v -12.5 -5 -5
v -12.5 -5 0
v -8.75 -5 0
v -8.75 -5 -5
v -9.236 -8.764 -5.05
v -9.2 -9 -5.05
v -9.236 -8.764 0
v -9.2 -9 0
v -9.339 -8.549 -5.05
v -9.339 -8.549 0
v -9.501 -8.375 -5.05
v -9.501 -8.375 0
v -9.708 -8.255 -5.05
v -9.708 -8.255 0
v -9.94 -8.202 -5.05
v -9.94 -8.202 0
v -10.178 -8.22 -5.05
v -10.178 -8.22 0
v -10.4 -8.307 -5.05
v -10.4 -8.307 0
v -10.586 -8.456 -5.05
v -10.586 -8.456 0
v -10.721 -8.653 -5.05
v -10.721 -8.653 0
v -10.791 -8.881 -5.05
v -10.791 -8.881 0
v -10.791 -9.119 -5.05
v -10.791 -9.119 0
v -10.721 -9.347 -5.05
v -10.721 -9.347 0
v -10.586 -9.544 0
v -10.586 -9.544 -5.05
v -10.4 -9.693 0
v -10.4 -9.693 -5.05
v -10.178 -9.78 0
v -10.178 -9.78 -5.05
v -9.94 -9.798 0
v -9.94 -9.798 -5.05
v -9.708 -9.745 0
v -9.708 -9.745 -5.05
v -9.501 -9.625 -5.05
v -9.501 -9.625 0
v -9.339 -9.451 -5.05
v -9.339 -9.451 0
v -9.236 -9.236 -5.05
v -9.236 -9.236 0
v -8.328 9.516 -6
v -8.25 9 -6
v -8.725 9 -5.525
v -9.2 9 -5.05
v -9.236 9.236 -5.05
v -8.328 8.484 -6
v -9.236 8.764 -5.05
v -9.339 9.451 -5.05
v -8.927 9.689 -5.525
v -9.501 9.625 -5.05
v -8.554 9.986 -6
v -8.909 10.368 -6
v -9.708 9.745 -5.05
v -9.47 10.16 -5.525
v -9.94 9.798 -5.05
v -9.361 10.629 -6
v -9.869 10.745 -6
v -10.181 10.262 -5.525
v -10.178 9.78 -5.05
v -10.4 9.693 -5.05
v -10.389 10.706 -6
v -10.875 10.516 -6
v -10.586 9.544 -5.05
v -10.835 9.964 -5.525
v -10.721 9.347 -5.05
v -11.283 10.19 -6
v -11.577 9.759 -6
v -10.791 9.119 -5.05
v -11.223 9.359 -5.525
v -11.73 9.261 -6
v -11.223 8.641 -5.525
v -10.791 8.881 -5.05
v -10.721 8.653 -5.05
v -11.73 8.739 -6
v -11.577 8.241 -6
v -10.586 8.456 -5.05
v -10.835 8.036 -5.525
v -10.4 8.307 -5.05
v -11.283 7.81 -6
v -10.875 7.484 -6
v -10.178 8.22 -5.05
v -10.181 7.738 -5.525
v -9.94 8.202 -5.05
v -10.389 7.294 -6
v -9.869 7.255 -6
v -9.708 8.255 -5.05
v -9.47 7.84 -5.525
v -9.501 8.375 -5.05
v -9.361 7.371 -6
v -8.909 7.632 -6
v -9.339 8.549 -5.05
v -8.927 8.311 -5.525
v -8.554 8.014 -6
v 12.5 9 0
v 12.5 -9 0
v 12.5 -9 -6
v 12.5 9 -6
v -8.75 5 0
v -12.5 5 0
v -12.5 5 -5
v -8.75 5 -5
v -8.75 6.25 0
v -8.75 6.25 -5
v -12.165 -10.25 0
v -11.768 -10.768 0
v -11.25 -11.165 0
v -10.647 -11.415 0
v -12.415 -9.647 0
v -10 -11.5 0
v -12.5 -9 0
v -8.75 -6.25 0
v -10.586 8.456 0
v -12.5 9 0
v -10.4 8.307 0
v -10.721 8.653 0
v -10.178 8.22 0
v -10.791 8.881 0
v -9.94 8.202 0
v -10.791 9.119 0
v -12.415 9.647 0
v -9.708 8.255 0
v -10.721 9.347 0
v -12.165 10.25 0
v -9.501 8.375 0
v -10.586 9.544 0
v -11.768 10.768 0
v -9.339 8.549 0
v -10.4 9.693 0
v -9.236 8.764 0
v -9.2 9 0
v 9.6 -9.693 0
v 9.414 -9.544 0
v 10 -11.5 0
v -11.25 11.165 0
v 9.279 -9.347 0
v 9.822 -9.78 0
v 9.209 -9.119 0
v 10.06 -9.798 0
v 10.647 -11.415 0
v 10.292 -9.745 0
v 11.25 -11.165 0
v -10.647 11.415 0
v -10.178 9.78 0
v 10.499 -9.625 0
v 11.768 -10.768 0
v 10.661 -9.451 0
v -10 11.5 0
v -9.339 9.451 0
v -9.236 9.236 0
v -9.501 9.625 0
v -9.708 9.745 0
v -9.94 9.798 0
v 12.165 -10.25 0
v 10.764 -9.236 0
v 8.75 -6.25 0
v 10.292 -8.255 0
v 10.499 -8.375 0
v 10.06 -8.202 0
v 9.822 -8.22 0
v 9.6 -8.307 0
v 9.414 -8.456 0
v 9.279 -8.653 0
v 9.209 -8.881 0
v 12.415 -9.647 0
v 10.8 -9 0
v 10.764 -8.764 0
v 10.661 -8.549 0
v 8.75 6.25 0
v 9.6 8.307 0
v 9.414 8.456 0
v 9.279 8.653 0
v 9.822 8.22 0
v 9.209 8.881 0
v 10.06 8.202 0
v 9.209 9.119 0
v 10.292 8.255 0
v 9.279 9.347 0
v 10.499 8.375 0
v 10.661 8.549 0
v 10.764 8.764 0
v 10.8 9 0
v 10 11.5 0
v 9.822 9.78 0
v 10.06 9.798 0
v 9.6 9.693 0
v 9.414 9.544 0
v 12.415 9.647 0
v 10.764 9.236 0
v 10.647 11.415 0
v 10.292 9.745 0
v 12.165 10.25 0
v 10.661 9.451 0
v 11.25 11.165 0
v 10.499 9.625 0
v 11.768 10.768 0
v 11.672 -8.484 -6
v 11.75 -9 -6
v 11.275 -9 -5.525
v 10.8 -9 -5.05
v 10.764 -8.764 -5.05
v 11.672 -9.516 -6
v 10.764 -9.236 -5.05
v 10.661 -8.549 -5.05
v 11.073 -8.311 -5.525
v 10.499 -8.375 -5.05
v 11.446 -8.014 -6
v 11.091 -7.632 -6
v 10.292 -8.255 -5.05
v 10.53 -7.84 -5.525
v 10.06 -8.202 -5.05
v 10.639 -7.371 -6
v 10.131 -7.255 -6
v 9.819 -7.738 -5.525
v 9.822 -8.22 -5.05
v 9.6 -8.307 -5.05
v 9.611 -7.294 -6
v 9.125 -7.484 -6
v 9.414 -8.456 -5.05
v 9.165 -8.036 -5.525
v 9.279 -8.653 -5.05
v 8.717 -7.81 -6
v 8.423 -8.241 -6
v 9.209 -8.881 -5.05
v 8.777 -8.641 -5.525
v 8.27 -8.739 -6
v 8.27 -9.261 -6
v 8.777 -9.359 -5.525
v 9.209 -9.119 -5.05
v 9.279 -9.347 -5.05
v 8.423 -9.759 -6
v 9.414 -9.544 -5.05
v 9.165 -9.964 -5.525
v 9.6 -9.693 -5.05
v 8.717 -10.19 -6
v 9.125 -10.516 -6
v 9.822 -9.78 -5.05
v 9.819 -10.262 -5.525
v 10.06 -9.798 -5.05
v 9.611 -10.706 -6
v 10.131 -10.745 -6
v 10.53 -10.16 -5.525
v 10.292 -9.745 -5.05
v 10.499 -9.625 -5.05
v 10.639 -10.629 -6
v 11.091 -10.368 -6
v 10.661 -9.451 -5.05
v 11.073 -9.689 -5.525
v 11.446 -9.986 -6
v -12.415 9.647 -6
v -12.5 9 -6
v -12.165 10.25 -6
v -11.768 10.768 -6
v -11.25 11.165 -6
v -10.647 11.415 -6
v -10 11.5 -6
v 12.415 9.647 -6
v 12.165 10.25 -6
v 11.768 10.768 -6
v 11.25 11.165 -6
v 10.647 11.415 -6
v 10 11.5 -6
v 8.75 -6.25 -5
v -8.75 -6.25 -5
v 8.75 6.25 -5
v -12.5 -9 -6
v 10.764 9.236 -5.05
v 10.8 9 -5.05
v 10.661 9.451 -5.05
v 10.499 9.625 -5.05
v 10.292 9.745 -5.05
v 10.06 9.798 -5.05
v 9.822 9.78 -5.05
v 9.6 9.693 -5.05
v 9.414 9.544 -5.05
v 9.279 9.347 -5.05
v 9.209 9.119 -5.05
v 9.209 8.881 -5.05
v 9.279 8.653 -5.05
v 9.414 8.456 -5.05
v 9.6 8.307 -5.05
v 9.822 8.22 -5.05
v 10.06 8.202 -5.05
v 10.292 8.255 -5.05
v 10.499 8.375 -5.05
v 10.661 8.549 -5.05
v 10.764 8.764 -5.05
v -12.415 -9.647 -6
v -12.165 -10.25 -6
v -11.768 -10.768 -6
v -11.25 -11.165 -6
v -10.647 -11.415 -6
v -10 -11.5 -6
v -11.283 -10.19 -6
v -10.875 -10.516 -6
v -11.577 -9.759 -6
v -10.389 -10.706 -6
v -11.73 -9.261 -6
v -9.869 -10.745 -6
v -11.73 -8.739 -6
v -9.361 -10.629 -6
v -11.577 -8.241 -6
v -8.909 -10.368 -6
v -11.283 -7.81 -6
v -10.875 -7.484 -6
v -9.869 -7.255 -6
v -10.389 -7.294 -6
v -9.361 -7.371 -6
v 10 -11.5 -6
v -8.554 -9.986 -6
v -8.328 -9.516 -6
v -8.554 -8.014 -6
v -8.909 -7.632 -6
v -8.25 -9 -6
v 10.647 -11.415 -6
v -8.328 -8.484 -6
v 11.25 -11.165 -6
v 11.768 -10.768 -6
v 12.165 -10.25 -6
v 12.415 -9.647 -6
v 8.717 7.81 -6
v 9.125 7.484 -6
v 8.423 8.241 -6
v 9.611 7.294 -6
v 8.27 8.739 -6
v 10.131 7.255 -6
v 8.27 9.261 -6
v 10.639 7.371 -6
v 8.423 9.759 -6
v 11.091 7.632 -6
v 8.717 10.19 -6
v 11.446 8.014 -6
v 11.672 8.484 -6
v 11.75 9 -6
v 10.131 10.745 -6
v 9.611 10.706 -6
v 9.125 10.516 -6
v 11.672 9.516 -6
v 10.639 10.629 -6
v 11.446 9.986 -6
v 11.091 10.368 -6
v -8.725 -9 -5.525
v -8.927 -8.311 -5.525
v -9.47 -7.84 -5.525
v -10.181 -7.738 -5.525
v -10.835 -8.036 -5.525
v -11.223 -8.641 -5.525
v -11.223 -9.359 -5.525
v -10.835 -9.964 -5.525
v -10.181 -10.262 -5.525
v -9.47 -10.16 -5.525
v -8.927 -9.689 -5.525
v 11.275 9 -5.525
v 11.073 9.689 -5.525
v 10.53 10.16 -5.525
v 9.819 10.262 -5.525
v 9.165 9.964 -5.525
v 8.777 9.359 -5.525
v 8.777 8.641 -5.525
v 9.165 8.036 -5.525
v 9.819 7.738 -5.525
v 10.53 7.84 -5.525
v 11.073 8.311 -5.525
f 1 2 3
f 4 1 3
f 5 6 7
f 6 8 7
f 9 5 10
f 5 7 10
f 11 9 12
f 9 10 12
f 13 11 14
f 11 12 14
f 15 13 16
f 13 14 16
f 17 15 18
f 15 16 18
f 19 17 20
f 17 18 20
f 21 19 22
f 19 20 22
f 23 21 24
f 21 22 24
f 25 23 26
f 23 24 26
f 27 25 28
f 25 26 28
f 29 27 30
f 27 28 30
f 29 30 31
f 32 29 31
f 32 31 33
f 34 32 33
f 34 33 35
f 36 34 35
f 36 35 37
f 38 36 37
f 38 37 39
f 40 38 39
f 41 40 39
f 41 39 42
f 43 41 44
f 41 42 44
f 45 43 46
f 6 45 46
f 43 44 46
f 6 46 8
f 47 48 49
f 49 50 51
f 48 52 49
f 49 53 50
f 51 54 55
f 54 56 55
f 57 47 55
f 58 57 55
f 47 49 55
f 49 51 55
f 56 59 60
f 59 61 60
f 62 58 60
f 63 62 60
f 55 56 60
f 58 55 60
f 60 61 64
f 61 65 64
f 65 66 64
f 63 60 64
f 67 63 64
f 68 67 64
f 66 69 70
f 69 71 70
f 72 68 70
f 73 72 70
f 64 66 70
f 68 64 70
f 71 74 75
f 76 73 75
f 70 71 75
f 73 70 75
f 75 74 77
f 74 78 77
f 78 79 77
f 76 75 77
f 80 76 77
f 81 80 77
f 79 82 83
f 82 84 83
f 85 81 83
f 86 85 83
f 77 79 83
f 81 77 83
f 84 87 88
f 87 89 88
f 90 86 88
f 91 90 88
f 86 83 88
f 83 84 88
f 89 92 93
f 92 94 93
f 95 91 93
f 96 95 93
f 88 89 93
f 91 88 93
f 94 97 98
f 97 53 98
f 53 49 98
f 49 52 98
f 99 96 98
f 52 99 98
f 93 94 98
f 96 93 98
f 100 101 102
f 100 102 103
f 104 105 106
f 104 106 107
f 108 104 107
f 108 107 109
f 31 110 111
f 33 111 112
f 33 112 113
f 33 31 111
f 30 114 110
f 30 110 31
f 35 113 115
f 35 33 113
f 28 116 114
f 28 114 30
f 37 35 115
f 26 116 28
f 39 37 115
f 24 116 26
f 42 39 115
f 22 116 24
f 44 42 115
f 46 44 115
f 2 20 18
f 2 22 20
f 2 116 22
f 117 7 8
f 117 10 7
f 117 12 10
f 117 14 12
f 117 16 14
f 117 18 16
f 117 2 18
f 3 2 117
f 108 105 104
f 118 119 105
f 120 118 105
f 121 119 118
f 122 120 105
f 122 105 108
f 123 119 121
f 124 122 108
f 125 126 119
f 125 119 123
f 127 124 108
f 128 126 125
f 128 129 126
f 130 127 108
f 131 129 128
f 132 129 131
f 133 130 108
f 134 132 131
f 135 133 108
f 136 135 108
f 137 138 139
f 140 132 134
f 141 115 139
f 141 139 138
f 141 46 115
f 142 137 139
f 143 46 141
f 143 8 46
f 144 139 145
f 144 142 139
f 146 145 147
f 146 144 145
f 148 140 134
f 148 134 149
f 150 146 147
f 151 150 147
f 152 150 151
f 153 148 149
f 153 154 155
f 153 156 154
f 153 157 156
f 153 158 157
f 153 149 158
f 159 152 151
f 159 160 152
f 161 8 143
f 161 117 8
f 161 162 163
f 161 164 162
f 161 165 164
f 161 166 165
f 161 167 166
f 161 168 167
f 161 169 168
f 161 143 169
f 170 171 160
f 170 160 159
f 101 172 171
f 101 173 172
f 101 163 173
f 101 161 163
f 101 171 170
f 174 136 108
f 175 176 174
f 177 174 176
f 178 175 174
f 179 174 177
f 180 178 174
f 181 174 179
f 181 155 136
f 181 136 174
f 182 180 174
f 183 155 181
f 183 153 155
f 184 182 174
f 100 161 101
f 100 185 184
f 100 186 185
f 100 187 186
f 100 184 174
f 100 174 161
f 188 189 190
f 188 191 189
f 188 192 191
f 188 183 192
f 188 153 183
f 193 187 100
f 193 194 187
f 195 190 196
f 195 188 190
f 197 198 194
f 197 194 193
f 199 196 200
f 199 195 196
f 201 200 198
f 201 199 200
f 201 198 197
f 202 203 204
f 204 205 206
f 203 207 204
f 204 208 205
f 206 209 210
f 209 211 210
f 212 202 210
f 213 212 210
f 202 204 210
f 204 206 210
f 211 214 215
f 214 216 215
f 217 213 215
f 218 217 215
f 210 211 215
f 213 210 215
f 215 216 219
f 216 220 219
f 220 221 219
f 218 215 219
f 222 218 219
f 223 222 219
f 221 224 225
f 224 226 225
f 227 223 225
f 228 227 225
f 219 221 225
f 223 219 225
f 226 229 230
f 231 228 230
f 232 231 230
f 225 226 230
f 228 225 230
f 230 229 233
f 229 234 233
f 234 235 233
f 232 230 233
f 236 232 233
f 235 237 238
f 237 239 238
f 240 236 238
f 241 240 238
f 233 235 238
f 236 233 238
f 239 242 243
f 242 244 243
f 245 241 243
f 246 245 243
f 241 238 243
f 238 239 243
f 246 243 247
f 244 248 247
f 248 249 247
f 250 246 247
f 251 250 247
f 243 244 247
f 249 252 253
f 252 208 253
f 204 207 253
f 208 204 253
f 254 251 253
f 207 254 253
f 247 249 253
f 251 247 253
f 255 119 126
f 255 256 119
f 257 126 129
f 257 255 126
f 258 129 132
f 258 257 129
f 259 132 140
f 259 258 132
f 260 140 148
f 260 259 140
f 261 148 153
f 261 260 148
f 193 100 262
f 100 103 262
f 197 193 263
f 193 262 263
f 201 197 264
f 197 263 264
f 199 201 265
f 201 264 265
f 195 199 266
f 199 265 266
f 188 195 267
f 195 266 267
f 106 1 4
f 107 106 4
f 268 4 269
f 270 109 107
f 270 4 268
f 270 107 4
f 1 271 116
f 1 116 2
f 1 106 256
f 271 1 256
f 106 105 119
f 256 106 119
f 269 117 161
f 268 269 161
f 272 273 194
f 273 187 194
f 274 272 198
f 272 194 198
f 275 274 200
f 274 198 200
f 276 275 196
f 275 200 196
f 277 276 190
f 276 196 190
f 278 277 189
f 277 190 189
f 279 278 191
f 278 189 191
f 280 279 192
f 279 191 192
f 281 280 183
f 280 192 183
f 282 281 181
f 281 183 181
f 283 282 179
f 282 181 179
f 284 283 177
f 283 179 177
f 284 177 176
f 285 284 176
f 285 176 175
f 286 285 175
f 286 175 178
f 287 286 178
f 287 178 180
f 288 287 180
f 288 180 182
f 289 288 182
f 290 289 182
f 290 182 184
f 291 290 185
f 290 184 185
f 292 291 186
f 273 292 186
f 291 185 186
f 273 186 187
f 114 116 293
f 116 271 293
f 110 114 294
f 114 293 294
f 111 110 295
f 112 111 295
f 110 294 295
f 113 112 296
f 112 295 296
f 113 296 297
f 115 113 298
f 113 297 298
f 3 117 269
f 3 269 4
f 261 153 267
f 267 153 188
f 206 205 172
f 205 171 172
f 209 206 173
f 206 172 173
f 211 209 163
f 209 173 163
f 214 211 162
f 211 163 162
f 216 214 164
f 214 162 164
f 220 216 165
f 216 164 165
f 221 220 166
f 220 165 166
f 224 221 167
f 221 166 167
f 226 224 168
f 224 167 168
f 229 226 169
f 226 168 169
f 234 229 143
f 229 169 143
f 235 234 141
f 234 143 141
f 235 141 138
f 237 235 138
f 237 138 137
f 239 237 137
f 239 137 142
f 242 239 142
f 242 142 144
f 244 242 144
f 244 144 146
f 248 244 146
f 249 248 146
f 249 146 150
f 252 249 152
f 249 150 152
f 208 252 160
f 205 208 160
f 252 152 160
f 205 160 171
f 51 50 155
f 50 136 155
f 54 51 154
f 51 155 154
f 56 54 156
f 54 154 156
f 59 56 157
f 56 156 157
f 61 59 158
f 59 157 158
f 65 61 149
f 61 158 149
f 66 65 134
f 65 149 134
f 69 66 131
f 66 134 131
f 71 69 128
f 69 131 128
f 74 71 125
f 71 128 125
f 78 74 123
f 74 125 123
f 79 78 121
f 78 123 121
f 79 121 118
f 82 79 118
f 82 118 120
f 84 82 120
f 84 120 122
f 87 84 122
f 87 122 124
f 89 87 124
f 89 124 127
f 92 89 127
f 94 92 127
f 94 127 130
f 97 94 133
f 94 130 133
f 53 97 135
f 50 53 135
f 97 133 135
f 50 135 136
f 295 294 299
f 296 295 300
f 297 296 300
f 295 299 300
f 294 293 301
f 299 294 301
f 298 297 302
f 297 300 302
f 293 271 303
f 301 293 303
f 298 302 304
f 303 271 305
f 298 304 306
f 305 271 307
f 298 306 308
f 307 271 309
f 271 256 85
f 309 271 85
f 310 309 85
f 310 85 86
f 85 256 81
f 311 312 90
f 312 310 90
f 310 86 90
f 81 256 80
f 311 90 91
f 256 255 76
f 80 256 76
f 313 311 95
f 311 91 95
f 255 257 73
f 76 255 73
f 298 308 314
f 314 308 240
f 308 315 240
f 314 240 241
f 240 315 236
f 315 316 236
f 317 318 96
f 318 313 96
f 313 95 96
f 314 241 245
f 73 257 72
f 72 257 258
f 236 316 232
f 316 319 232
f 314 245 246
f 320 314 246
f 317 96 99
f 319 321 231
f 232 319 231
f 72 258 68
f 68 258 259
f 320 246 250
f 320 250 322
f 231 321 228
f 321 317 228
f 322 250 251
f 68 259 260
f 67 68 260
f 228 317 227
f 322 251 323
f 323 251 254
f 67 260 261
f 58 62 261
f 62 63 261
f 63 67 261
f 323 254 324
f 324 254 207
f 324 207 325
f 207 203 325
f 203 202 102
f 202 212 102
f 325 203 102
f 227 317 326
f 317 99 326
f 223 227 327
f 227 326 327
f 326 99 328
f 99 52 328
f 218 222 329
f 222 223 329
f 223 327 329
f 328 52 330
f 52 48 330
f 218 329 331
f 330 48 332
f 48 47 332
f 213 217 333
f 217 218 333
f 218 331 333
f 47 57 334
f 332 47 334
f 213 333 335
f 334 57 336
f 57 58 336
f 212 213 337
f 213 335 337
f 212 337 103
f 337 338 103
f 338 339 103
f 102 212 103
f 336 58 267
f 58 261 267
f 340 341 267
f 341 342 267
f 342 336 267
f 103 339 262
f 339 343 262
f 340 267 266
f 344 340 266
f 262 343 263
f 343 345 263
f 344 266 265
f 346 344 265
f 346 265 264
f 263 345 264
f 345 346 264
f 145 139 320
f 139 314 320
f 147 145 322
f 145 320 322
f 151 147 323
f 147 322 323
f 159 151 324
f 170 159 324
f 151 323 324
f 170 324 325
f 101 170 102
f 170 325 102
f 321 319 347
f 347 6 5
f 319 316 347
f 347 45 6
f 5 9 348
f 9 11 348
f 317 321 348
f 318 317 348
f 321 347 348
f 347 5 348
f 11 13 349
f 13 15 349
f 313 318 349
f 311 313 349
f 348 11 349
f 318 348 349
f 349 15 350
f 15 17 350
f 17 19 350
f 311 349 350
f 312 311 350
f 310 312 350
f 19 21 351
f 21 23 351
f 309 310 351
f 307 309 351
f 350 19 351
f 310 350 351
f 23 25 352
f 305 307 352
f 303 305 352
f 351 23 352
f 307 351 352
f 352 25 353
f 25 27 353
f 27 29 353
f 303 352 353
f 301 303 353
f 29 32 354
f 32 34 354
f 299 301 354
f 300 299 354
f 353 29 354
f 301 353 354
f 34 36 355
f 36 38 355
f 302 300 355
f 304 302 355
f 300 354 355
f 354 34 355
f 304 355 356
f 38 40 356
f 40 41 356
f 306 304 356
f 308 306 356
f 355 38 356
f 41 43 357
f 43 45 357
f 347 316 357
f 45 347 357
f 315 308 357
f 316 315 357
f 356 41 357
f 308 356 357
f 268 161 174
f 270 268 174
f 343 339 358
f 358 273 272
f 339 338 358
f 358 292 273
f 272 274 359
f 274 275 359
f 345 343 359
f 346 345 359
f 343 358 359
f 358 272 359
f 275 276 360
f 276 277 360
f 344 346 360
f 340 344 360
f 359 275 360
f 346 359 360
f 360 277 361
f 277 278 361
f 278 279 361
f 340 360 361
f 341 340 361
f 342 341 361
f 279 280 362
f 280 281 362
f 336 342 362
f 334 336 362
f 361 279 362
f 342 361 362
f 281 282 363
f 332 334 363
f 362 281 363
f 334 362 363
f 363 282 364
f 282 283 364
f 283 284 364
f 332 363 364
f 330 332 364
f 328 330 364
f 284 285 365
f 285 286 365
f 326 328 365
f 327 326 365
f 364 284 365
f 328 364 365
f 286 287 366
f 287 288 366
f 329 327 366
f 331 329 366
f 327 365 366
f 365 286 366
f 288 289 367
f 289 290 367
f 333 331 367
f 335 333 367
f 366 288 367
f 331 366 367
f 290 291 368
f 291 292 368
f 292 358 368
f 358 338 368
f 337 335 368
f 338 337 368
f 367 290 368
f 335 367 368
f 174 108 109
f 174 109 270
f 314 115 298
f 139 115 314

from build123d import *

# Parameters (mm, degrees)
SKIZZE1_W                                            = 25
SKIZZE1_H                                            = 23
AUFSATZ_LINEAR_AUSTRAGEN1_DEPTH                      = 6
SKIZZE1_3_W                                          = 17.5
SKIZZE1_3_H                                          = 12.5
SCHNITT_LINEAR_AUSTRAGEN1_DEPTH                      = 5
SKIZZE2_W                                            = 3.75
SKIZZE2_H                                            = 10
SCHNITT_LINEAR_AUSTRAGEN2_DEPTH                      = 5
FORMSENKUNG_F_R_M3_SENKSCHRAUBE_MIT_INNE_D           = 1.6
FORMSENKUNG_F_R_M3_SENKSCHRAUBE_MIT_INNE_CSINK_D     = 3.5
FORMSENKUNG_F_R_M3_SENKSCHRAUBE_MIT_INNE_CSINK_ANGLE = 90
VERRUNDUNG1_R                                        = 2.5


with BuildPart() as part:
    # Skizze1 → Aufsatz-Linear austragen1 (new body)
    with BuildSketch(Plane.XY):
        Rectangle(SKIZZE1_W, SKIZZE1_H)
    extrude(amount=-AUFSATZ_LINEAR_AUSTRAGEN1_DEPTH)

    # Skizze1<3> → Schnitt-Linear austragen1 (cut)
    with BuildSketch(Plane.XY):
        Rectangle(SKIZZE1_3_W, SKIZZE1_3_H)
    extrude(amount=-SCHNITT_LINEAR_AUSTRAGEN1_DEPTH, mode=Mode.SUBTRACT)

    # Skizze2 → Schnitt-Linear austragen2 (cut)
    with BuildSketch(Plane.XY):
        with Locations((-10.625, 0)):
            Rectangle(SKIZZE2_W, SKIZZE2_H)
    extrude(amount=-SCHNITT_LINEAR_AUSTRAGEN2_DEPTH, mode=Mode.SUBTRACT)

    # Formsenkung für M3 Senkschraube mit Innensechskant1 (through all)
    with Locations(Plane(origin=(0, 0, -6), x_dir=(-1, 0, 0), z_dir=(0, 0, -1))):
        with Locations((-10, 9), (10, 9), (10, -9), (-10, -9)):
            CounterSinkHole(FORMSENKUNG_F_R_M3_SENKSCHRAUBE_MIT_INNE_D / 2, FORMSENKUNG_F_R_M3_SENKSCHRAUBE_MIT_INNE_CSINK_D / 2, counter_sink_angle=FORMSENKUNG_F_R_M3_SENKSCHRAUBE_MIT_INNE_CSINK_ANGLE)

    # Verrundung1
    verrundung1_edges = [part.edges().sort_by_distance(p)[0] for p in [
        (-12.5, 11.5, -3),
        (12.5, 11.5, -3),
        (12.5, -11.5, -3),
        (-12.5, -11.5, -3),
    ]]
    fillet(verrundung1_edges, radius=VERRUNDUNG1_R)


solid = part.part
